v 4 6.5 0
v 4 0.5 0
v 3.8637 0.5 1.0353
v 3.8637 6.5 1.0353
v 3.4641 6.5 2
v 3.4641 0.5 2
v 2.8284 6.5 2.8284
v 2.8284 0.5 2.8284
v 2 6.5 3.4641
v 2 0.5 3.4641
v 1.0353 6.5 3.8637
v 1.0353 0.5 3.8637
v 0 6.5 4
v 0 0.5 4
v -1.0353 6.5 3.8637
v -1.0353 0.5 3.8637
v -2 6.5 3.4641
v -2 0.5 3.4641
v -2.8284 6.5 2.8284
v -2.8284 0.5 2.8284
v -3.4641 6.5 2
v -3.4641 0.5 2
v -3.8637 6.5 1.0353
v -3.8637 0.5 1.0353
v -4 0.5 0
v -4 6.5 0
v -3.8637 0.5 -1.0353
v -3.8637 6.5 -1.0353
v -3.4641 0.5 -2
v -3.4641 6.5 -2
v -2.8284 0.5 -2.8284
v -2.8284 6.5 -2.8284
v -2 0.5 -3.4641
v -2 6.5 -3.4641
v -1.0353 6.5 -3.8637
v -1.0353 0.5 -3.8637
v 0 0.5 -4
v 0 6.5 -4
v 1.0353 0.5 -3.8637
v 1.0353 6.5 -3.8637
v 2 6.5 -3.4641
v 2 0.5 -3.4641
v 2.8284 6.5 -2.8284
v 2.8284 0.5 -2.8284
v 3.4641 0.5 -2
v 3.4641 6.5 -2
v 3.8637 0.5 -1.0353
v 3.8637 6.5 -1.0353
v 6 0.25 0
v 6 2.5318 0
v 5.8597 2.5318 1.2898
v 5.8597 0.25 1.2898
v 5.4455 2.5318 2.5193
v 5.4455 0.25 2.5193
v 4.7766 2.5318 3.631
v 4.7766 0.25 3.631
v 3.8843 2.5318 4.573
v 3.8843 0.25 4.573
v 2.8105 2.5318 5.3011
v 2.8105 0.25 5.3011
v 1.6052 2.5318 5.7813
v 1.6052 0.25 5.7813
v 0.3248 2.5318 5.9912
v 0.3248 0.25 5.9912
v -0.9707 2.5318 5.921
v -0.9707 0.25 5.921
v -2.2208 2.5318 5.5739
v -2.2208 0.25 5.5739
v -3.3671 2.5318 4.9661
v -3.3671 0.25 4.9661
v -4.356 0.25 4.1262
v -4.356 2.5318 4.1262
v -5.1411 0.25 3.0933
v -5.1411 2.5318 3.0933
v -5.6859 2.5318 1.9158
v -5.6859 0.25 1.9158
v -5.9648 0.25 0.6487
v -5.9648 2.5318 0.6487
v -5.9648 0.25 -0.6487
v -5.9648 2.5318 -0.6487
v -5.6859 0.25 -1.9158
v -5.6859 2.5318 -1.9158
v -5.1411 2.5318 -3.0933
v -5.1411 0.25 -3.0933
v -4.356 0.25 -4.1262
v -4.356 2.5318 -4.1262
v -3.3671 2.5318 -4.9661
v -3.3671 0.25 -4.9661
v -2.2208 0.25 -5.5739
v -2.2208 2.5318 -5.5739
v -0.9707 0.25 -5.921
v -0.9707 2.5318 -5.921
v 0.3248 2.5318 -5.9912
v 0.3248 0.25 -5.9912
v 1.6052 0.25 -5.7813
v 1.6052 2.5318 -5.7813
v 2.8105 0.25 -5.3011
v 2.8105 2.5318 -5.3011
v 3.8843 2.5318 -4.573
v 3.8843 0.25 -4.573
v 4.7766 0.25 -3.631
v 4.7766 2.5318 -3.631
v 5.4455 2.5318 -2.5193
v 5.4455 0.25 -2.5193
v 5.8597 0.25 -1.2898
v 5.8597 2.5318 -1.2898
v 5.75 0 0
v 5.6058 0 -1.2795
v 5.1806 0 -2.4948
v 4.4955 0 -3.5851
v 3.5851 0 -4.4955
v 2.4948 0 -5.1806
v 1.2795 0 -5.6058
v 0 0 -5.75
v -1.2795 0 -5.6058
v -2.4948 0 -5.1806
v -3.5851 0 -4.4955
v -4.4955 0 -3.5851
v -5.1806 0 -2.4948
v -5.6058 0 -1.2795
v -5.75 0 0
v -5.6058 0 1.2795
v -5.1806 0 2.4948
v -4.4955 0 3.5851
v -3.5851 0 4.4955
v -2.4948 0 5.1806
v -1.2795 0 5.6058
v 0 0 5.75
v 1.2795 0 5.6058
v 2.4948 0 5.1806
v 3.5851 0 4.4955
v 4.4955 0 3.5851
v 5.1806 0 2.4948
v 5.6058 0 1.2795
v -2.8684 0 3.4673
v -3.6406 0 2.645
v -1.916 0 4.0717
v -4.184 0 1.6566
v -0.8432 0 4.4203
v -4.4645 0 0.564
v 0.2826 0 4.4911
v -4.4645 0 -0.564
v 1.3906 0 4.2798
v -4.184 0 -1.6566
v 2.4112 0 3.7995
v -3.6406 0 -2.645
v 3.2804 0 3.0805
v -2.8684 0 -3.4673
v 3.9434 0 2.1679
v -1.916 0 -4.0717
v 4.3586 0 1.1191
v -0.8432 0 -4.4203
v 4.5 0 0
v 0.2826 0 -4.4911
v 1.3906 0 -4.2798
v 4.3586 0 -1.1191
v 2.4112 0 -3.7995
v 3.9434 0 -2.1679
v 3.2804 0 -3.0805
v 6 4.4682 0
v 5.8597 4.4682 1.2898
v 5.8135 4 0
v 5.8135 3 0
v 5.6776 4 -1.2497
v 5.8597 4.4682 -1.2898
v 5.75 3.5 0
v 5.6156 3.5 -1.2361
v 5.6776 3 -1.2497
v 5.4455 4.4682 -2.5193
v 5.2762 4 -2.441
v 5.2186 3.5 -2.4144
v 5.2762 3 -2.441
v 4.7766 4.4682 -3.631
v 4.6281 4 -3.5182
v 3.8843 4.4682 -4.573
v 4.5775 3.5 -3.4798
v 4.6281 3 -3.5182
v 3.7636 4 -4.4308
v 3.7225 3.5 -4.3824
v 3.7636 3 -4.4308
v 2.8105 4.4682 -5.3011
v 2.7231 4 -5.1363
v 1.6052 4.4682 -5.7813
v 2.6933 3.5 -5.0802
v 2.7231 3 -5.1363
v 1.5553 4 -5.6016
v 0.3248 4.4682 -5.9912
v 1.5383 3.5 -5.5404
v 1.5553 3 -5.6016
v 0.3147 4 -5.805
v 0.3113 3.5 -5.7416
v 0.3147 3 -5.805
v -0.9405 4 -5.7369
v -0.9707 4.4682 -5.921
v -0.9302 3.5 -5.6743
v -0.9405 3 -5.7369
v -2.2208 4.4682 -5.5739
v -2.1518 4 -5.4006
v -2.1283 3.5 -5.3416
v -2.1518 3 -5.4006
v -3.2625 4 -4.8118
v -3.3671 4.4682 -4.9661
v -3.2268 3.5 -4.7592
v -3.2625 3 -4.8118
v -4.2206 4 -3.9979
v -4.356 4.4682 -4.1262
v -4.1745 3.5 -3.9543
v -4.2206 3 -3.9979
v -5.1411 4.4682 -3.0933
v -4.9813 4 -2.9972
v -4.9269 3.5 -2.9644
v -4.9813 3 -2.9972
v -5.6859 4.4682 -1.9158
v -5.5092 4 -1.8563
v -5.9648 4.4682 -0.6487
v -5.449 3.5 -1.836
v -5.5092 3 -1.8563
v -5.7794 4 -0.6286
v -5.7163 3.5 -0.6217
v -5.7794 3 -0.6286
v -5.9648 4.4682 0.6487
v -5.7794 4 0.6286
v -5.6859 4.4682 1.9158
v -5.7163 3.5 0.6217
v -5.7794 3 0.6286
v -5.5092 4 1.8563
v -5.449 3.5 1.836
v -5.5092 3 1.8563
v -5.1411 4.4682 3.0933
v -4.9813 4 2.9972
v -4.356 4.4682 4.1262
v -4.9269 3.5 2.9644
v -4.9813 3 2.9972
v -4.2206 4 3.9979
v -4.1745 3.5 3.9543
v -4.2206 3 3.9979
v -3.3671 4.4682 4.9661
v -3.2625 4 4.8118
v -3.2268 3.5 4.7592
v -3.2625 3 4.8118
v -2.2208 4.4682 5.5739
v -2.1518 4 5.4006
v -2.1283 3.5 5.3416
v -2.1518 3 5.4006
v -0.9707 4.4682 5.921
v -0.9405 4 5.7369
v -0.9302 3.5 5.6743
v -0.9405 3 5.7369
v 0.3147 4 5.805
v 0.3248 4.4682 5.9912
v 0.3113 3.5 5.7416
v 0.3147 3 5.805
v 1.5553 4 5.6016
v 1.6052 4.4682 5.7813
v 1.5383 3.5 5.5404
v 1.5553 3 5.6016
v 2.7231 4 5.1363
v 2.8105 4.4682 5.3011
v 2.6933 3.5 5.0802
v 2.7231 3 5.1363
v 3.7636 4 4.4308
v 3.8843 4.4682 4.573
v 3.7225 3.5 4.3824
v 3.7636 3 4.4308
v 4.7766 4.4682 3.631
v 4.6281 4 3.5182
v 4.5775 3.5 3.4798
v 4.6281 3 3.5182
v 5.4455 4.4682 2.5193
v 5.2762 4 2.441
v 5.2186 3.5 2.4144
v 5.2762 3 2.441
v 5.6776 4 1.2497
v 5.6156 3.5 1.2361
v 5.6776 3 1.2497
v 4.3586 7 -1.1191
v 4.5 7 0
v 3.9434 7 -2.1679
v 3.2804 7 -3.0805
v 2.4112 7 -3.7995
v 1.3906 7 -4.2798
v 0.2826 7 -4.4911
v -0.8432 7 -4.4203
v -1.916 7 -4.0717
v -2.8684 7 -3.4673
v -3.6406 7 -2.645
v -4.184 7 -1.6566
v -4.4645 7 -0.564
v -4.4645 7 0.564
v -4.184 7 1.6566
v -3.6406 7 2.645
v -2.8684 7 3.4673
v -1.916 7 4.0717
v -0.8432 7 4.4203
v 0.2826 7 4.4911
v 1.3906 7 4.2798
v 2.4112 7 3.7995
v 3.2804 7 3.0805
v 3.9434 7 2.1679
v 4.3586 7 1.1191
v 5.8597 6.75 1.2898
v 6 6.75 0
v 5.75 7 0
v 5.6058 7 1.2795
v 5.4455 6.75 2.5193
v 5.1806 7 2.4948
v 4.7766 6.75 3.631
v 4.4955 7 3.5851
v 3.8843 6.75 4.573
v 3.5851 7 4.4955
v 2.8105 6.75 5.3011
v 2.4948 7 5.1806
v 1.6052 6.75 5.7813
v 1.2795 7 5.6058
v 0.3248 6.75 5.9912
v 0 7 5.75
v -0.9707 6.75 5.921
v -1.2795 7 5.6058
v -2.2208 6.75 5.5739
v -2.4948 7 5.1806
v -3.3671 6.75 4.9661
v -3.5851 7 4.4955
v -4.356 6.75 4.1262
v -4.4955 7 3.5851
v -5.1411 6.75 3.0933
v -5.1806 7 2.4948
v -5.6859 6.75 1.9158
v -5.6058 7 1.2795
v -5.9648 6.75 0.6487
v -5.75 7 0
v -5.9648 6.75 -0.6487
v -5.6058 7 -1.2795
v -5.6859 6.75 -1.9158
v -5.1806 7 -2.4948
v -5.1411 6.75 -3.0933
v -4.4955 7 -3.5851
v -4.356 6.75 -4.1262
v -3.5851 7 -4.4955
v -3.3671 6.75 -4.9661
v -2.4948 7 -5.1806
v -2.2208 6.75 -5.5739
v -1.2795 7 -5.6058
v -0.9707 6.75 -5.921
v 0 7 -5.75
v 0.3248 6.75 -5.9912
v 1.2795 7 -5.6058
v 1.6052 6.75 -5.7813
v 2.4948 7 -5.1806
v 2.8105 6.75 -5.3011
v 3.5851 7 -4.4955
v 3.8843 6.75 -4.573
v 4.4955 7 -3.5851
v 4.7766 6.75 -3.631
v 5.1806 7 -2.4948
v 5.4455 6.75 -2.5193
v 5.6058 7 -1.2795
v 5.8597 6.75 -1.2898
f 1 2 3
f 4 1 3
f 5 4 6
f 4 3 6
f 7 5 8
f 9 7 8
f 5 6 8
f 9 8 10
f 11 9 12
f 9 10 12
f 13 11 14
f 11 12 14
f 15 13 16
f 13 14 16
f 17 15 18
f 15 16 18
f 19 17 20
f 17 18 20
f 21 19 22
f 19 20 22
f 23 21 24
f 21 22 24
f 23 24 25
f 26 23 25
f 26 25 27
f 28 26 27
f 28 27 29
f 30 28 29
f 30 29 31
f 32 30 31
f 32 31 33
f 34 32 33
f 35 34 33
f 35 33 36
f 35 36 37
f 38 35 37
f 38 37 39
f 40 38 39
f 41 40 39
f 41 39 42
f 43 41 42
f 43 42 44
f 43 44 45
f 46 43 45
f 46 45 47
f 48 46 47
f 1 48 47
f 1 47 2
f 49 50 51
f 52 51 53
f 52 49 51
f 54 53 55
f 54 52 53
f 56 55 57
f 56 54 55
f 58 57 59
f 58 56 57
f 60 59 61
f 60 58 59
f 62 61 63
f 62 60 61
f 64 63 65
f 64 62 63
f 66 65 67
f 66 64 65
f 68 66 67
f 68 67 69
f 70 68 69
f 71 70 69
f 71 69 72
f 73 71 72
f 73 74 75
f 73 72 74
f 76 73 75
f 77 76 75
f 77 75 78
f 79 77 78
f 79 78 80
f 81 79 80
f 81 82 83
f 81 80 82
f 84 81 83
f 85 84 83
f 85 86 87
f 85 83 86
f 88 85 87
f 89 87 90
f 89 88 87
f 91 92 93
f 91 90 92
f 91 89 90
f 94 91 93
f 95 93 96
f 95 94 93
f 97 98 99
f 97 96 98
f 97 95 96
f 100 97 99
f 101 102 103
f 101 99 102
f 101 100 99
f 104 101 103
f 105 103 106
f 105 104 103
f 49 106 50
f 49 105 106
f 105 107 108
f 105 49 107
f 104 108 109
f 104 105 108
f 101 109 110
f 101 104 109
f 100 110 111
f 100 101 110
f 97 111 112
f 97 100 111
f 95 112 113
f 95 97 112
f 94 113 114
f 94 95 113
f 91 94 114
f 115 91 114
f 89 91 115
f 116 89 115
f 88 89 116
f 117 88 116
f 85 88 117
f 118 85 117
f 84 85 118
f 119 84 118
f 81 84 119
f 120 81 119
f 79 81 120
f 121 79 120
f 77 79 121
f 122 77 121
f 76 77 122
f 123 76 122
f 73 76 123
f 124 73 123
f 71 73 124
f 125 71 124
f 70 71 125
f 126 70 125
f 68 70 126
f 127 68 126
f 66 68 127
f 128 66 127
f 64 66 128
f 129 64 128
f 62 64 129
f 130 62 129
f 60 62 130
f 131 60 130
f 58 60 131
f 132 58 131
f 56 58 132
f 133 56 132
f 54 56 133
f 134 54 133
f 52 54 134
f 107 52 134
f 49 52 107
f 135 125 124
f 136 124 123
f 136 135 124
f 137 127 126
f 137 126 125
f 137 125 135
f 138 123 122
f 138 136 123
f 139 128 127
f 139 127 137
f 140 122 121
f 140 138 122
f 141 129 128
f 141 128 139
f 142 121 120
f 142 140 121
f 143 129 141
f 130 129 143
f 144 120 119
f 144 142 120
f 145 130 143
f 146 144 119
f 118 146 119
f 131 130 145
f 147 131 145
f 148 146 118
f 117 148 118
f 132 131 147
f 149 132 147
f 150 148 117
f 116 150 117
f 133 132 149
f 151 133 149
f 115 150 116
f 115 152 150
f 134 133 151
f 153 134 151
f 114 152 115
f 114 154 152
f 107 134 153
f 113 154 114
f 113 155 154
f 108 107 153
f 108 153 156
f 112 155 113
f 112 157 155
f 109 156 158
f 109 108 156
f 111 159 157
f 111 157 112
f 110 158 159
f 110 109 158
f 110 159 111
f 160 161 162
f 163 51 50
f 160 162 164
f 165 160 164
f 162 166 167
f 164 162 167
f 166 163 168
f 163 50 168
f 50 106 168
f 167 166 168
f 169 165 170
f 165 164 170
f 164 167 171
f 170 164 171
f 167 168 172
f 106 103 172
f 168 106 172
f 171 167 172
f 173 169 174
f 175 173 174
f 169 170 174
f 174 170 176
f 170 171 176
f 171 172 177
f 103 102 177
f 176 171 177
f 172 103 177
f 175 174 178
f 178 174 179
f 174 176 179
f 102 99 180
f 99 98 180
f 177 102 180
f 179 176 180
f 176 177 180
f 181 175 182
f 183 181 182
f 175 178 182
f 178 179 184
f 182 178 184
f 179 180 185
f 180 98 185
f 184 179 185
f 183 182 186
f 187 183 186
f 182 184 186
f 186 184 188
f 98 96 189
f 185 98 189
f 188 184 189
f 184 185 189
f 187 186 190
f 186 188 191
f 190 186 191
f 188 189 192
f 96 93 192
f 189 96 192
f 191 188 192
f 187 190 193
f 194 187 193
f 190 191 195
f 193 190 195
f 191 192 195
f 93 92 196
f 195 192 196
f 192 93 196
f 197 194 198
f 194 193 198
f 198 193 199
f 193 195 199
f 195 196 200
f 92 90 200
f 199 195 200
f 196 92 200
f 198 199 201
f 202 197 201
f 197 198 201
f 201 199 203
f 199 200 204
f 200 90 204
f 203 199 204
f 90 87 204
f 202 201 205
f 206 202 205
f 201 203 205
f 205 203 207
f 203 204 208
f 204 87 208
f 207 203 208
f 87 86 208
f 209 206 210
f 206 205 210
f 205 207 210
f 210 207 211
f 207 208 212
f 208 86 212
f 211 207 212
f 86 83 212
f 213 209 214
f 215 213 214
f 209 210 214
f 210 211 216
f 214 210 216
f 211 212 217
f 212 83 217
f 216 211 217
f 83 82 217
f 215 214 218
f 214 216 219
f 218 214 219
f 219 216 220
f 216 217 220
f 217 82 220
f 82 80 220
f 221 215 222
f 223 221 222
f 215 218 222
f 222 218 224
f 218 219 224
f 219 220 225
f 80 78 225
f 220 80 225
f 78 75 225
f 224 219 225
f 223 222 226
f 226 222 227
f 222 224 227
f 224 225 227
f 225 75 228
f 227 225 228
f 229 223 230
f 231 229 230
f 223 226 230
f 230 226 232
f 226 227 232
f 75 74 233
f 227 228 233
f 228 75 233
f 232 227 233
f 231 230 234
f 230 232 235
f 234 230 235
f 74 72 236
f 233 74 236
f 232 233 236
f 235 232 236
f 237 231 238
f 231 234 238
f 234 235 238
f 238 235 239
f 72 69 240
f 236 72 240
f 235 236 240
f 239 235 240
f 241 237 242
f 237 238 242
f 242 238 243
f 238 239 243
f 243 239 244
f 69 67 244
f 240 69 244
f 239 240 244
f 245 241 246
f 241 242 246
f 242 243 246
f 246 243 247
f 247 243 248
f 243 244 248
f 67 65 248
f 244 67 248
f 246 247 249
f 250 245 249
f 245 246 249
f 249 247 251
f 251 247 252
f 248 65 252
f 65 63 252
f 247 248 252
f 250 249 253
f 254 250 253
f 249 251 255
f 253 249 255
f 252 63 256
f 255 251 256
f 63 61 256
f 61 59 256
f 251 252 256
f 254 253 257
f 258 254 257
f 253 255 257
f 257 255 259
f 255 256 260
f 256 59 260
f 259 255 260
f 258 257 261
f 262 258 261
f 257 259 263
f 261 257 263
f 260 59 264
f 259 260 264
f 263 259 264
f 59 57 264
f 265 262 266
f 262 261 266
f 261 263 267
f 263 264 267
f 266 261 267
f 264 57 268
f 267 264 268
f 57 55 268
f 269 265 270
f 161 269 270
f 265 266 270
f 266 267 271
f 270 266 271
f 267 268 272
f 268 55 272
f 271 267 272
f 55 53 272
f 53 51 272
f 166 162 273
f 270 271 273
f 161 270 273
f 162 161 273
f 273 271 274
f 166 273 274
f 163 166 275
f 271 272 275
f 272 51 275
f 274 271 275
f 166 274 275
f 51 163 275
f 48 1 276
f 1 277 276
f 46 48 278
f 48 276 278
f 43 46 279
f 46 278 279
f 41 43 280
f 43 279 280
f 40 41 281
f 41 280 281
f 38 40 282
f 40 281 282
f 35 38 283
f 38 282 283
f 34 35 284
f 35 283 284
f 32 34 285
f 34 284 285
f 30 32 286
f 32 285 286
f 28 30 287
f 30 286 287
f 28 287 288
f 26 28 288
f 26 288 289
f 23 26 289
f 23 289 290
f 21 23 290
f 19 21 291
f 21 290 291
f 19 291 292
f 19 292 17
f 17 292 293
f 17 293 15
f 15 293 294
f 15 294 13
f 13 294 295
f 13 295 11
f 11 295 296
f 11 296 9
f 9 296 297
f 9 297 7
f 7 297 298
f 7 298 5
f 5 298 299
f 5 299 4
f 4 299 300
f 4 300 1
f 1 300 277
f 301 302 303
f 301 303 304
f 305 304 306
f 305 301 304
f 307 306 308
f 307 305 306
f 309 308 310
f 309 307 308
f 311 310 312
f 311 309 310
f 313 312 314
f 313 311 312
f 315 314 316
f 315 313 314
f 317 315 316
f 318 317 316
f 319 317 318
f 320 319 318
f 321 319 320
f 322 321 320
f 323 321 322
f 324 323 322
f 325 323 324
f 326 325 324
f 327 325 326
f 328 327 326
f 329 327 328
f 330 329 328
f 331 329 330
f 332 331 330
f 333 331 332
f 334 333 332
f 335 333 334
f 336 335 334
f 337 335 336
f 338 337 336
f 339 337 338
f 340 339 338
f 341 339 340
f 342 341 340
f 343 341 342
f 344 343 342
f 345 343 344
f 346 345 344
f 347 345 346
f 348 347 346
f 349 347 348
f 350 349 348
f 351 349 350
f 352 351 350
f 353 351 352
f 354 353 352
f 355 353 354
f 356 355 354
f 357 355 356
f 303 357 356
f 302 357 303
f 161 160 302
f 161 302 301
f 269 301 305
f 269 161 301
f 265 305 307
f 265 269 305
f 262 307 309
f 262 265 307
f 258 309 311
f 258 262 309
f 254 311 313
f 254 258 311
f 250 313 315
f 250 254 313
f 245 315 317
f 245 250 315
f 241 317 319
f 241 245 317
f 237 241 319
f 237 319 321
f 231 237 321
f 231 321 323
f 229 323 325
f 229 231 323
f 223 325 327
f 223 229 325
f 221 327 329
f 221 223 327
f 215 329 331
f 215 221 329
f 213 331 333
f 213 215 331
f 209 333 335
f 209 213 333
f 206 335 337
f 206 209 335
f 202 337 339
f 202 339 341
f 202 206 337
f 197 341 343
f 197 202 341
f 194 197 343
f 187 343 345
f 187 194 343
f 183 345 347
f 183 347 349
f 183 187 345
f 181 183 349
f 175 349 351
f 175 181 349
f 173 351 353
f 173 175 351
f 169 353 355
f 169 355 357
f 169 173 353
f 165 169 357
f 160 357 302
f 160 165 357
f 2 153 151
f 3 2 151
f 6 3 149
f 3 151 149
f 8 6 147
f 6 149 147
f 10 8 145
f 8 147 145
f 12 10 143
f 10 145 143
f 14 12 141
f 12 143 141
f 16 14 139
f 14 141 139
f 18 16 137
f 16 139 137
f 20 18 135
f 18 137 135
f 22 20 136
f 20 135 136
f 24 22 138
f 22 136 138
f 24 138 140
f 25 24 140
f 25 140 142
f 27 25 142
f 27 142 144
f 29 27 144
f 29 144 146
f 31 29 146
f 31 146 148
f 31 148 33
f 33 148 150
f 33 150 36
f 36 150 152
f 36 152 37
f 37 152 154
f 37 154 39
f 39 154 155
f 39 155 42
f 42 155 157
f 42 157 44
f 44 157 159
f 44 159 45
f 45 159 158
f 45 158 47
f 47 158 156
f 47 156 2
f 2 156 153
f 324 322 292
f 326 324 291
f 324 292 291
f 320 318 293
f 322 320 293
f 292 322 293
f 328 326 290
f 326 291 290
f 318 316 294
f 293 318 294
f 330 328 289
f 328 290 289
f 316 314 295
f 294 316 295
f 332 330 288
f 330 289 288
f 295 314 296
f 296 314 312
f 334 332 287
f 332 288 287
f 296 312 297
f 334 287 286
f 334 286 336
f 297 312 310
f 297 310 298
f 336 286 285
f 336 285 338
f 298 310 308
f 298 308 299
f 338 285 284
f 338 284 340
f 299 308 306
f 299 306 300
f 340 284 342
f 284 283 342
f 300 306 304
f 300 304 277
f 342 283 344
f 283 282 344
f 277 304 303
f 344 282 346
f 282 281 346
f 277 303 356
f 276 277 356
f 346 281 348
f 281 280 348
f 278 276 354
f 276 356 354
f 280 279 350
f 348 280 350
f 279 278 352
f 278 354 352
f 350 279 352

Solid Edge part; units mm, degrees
sketch "Sketch1" plane through (0, 0, 0) normal (0, -1, 0) x (1, 0, 0)
  circle A0 centre (0, 0) radius 4
  circle A1 centre (0, 0) radius 6
  dimension "D1" = 2
extrude "Protrusion1" add sketch "Sketch1" against normal blind 7
sketch "Sketch2" plane through (0, 0, 0) normal (0, 0, 1) x (1, 0, 0)
  circle A0 centre (7.75, 3.5) radius 2
revolve "RevolvedCutout1" cut sketch "Sketch2" angle 360 about axis through (0, 0, 0) along (0, 1, 0)
chamfer "Chanfrein_1" distance 0.25 angle 45 2 edges at (-6, 7, 0) (-6, 0, 0)
chamfer "Chanfrein_2" distance 0.5 angle 45 2 edges at (-4, 0, 0) (-4, 7, 0)
properties material "Steel"
